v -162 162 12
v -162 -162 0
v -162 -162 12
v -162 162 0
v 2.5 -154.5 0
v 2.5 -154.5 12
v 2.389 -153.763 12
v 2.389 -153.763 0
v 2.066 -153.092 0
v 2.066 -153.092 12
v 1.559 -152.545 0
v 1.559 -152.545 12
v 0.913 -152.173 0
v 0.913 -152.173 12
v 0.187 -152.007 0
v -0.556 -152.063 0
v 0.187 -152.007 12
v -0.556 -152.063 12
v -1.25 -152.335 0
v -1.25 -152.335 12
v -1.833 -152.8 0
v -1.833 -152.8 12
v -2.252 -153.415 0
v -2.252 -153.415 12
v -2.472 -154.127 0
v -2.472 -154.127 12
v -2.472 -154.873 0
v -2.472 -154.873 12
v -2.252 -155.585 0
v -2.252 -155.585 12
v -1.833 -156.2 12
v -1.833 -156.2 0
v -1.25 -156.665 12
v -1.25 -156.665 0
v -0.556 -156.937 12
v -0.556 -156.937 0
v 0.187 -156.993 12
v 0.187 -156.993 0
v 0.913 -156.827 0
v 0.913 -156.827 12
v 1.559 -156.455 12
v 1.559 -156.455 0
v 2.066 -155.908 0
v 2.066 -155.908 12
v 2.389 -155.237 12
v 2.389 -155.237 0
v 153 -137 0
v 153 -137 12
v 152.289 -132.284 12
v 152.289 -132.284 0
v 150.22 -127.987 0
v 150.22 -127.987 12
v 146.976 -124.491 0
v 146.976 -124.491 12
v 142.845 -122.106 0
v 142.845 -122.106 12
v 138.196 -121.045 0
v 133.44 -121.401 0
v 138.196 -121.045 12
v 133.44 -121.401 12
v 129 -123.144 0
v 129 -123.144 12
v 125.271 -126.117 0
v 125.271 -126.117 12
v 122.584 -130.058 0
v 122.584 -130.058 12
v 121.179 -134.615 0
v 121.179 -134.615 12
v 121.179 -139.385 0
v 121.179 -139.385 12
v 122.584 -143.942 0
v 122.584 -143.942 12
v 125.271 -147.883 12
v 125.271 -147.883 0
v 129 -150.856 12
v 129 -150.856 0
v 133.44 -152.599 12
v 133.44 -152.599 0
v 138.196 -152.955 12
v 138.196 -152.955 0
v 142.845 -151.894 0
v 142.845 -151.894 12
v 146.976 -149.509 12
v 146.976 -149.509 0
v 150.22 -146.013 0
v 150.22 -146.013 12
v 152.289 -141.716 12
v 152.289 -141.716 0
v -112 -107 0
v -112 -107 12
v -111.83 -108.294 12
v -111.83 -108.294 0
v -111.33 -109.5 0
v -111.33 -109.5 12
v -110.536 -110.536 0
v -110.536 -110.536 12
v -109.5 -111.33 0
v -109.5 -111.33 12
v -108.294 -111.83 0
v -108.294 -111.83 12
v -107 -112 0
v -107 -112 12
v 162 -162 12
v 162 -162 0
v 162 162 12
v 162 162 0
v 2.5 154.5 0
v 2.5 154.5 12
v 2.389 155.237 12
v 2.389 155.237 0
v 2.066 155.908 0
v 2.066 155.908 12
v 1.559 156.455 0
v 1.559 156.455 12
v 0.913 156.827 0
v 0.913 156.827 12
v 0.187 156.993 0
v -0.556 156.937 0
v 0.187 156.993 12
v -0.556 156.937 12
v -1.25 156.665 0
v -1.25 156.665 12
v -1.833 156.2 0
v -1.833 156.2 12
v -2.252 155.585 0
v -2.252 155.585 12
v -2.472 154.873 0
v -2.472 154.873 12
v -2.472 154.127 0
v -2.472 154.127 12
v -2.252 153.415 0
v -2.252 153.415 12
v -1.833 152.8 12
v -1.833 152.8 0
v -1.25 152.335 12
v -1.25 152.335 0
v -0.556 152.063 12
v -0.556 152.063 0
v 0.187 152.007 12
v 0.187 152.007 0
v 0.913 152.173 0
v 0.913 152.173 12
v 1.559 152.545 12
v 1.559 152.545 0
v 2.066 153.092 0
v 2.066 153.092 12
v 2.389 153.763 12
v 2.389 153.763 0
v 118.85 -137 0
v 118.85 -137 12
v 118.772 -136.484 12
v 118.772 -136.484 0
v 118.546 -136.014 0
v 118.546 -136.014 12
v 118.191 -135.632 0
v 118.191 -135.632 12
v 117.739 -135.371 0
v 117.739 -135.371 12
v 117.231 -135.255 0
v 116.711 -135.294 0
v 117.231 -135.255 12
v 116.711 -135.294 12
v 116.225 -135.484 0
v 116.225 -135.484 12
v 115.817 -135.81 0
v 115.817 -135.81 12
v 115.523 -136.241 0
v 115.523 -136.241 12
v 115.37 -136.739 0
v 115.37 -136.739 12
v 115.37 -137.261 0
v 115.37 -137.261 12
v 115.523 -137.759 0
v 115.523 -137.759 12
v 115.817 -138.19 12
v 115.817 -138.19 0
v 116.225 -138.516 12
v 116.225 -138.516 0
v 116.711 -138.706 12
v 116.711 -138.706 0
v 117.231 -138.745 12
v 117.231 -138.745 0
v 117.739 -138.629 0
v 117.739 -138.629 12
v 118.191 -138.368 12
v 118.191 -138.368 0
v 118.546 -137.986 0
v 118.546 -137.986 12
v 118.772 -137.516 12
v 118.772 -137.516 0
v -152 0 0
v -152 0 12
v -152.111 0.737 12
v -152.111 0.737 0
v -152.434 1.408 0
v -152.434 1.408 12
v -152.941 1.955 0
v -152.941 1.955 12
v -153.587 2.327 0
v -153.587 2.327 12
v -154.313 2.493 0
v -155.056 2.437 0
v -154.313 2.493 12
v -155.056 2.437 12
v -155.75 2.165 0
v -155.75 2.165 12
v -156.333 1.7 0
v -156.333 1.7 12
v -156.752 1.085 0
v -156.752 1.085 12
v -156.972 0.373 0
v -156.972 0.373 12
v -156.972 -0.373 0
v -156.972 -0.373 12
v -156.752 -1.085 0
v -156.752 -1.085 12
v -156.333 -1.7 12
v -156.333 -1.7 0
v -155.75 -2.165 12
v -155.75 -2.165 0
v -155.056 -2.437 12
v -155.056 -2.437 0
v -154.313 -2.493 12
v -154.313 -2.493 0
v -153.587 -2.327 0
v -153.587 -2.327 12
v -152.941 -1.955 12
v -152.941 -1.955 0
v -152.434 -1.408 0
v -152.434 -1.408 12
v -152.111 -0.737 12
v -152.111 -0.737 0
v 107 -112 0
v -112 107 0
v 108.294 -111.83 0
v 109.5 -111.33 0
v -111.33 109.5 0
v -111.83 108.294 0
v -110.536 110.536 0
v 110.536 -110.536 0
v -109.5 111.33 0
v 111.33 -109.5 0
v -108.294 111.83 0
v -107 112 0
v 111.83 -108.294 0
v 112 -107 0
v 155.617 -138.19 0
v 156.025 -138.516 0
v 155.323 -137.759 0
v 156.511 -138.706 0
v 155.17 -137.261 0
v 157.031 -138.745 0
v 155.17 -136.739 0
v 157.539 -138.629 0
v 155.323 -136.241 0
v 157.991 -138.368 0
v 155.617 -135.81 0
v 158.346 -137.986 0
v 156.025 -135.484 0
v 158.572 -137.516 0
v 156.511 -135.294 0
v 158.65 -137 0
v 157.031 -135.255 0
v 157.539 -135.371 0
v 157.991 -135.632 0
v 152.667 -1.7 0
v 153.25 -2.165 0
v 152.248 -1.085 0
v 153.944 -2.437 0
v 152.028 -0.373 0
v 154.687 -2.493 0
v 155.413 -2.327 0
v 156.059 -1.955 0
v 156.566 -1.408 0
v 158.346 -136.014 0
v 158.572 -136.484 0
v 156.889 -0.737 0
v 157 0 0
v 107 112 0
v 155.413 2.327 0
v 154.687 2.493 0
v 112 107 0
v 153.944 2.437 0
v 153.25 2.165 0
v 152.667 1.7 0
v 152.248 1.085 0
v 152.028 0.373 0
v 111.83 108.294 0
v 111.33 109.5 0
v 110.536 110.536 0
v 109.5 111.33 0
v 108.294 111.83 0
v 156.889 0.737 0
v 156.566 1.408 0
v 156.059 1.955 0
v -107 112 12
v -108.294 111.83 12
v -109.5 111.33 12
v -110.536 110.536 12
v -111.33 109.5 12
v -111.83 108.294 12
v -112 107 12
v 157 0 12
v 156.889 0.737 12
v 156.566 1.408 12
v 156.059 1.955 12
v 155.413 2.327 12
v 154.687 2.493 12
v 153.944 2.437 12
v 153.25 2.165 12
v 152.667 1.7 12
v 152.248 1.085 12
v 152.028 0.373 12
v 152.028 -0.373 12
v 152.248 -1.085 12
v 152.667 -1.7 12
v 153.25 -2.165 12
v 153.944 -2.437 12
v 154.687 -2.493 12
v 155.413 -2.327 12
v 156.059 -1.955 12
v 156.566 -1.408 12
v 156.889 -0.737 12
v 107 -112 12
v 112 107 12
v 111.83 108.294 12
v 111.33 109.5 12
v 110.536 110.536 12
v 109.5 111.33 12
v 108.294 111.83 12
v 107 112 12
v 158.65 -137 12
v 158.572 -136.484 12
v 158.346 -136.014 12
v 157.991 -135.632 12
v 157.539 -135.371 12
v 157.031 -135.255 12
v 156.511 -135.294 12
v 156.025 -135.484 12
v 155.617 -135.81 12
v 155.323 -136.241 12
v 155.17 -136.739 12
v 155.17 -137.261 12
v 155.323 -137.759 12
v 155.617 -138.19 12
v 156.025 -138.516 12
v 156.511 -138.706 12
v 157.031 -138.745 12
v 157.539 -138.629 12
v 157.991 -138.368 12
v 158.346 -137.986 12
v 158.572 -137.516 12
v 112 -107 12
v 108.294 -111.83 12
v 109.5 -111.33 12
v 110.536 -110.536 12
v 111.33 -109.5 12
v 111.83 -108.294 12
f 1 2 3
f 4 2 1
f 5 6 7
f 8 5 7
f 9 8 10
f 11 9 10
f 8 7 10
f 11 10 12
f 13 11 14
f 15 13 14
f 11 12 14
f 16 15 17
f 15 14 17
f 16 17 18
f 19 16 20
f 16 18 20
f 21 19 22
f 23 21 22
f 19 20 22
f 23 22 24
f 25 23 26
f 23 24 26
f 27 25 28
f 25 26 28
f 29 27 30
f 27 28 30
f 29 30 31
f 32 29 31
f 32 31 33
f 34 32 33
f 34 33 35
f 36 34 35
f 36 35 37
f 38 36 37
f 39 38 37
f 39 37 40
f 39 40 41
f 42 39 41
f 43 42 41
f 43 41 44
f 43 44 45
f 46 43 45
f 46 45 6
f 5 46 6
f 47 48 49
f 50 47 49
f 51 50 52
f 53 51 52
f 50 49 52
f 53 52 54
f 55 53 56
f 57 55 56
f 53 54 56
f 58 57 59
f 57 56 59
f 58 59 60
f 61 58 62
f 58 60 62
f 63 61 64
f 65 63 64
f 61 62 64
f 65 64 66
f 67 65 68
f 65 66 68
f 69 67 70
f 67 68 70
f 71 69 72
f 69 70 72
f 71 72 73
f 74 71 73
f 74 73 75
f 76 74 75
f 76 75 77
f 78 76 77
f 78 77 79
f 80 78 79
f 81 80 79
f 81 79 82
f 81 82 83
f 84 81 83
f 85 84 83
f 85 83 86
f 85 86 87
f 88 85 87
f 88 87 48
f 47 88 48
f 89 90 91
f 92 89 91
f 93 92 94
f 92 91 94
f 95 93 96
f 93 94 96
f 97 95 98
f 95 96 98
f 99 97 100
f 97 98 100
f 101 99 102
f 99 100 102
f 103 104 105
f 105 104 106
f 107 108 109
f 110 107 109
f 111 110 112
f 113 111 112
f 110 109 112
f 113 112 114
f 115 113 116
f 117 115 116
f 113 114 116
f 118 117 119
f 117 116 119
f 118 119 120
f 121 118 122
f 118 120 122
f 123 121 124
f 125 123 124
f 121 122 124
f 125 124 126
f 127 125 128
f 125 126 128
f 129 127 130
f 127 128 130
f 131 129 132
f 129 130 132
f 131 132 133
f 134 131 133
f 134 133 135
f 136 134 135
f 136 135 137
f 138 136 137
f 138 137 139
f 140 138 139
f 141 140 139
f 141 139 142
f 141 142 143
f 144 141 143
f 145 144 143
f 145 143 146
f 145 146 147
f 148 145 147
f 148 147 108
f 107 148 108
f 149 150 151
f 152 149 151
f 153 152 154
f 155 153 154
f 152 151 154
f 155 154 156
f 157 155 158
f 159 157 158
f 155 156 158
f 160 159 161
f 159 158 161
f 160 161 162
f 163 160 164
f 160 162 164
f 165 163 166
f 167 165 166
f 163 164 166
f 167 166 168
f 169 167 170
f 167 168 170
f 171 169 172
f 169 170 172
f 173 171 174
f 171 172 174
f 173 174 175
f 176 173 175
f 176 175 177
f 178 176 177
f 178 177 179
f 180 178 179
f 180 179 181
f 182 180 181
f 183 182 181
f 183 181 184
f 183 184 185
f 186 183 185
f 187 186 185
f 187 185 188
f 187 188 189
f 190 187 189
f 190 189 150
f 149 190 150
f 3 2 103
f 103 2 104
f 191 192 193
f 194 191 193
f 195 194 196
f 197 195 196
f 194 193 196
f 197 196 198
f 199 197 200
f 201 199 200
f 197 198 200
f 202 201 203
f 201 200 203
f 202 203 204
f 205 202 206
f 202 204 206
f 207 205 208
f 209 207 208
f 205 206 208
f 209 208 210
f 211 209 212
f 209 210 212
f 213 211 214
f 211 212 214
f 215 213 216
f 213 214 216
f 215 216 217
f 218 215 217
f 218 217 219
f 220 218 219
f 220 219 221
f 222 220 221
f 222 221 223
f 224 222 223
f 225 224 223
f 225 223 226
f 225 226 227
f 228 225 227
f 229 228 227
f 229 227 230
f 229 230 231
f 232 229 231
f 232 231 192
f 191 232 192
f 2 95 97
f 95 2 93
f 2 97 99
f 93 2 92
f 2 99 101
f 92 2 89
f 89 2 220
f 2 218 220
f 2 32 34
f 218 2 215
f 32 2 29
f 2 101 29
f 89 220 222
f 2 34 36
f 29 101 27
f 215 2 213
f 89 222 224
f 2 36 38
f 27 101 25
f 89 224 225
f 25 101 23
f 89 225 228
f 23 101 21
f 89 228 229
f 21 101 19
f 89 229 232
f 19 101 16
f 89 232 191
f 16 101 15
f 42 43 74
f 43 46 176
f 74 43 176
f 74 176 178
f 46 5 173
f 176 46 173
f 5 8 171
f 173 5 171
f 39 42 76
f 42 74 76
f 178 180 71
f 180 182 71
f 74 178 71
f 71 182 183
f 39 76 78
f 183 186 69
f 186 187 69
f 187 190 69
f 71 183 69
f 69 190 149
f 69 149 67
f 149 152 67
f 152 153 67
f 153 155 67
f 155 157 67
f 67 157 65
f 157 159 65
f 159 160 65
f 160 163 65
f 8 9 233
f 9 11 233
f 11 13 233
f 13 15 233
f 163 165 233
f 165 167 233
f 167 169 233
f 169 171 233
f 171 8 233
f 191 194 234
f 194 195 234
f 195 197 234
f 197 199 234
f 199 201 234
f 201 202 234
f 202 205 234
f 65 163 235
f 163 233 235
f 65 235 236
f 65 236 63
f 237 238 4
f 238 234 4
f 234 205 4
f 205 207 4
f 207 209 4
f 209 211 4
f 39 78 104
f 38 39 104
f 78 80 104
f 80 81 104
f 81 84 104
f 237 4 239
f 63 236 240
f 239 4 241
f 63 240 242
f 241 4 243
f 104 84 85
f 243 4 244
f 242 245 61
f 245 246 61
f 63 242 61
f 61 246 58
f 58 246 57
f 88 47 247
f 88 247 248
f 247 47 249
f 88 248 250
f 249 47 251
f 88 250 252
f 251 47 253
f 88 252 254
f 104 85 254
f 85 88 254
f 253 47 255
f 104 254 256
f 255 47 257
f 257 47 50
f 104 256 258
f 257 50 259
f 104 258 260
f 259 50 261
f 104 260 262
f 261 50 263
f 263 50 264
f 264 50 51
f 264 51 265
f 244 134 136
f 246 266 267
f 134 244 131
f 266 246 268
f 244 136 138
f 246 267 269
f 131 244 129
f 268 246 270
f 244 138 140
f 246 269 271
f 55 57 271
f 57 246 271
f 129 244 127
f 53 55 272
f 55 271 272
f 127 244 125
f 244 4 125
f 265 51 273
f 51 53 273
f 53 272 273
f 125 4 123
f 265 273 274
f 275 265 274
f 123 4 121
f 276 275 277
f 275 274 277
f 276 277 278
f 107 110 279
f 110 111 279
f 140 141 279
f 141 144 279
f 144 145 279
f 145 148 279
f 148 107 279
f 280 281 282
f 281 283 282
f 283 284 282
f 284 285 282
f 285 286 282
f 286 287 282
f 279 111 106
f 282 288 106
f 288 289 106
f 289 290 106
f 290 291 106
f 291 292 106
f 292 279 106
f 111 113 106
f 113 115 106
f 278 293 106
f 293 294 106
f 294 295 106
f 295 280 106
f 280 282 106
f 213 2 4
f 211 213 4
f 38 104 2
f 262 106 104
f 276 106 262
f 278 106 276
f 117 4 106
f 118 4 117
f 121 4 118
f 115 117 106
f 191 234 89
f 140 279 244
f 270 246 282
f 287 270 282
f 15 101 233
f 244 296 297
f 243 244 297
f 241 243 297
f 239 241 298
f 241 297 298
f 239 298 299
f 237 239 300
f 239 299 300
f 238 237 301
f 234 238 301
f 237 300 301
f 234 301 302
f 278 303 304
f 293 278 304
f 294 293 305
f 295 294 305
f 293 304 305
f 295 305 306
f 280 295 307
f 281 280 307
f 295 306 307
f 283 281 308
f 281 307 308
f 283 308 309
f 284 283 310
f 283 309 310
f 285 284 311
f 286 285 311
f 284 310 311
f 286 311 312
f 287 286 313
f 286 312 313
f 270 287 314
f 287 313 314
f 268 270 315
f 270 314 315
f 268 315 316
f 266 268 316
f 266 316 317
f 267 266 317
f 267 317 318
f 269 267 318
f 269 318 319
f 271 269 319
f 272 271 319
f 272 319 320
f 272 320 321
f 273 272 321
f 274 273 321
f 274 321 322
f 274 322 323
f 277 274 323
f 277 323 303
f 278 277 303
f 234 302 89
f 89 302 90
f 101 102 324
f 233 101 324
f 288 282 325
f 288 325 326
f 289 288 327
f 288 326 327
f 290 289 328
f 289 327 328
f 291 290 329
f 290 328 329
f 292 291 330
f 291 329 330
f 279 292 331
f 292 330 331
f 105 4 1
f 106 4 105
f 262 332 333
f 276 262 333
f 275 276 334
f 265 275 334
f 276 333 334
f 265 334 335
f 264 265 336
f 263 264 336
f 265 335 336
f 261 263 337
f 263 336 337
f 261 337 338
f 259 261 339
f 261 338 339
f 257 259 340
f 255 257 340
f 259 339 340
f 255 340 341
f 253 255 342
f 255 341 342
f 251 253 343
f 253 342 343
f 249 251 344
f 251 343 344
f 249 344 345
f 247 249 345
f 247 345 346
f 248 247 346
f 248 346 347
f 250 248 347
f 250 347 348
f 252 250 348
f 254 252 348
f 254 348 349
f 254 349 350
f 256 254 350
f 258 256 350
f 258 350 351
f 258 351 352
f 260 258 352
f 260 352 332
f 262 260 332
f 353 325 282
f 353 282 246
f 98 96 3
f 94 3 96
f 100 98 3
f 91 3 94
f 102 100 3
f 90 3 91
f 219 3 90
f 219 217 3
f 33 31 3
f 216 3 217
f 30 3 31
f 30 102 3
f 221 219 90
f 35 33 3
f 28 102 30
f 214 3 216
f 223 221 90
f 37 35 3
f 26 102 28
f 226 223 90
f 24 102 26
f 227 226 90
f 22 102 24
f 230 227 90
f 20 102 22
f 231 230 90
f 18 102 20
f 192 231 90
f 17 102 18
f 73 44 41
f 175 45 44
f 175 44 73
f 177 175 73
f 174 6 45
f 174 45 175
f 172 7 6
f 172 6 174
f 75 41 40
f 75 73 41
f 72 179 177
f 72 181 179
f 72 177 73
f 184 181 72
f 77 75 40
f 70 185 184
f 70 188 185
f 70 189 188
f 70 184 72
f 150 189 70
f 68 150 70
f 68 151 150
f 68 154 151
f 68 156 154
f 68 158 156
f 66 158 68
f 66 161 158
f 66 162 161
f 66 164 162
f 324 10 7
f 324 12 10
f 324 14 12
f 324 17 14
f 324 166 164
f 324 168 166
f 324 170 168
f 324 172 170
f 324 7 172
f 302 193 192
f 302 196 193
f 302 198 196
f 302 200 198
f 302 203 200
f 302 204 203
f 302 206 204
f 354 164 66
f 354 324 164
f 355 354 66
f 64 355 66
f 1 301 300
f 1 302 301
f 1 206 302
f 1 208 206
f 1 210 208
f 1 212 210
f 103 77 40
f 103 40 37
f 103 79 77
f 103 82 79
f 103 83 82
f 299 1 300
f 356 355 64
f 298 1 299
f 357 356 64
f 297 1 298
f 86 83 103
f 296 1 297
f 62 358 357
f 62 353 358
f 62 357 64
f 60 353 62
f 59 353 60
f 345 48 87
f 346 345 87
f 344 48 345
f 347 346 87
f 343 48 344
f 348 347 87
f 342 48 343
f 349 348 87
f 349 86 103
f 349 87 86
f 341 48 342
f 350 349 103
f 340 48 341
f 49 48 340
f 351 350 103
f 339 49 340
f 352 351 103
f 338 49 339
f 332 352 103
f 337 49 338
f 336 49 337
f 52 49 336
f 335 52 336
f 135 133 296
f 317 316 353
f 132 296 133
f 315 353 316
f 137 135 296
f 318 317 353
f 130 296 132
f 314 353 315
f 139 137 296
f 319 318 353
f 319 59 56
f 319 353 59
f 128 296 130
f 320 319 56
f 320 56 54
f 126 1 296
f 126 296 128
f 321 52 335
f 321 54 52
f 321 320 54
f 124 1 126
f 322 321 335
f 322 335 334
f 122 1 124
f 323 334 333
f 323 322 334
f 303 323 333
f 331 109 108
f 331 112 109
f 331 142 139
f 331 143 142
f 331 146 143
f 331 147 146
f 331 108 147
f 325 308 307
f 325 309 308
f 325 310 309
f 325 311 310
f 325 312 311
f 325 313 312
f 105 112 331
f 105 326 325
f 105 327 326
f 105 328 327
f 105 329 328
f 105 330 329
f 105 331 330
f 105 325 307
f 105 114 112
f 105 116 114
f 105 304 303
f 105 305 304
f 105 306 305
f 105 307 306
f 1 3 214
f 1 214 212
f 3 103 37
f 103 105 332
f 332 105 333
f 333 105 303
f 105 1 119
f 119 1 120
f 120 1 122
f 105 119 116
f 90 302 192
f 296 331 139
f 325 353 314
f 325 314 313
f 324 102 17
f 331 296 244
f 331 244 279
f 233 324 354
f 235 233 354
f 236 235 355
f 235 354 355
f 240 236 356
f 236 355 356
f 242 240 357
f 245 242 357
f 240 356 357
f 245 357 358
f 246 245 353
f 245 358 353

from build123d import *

# Parameters (mm, degrees)
SKETCH_W        = 324
SKETCH_H        = 324
PAD_DEPTH       = 12
POCKET_DEPTH    = 12.001
SKETCH002_R     = 2.5
POCKET001_DEPTH = 12.001
SKETCH003_R     = 16
SKETCH003_R_2   = 1.75
POCKET002_DEPTH = 12.001


with BuildPart() as part:
    # Sketch → Pad (new body)
    with BuildSketch(Plane.XY):
        Rectangle(SKETCH_W, SKETCH_H)
    extrude(amount=PAD_DEPTH)

    # Sketch001 (on Face6 of Pad) → Pocket (cut, through all)
    with BuildSketch(Plane.XY.offset(12)):
        with BuildLine():
            Line((-112, 107.000007), (-112, -106.999984))
            ThreePointArc((-112, -106.999984), (-110.535541, -110.535527), (-107.000004, -112))
            Line((-107.000004, -112), (107.000004, -112))
            ThreePointArc((107.000004, -112), (110.535542, -110.535526), (112, -106.999982))
            Line((112, 107.000009), (112, -106.999982))
            ThreePointArc((112, 107.000009), (110.535532, 110.535536), (107.000003, 112))
            Line((-107.000005, 112), (107.000003, 112))
            ThreePointArc((-107.000005, 112), (-110.535533, 110.535535), (-112, 107.000007))
        make_face()
    extrude(amount=-POCKET_DEPTH, mode=Mode.SUBTRACT)

    # Sketch002 (on Face5 of Pocket) → Pocket001 (cut, through all)
    with BuildSketch(Plane.XY.offset(12)):
        with Locations((0, 154.5)):
            Circle(SKETCH002_R)
        with Locations((-154.5, 0)):
            Circle(SKETCH002_R)
        with Locations((154.5, 0)):
            Circle(SKETCH002_R)
        with Locations((0, -154.5)):
            Circle(SKETCH002_R)
    extrude(amount=-POCKET001_DEPTH, mode=Mode.SUBTRACT)

    # Sketch003 (on Face5 of Pocket001) → Pocket002 (cut, through all)
    with BuildSketch(Plane.XY.offset(12)):
        with Locations((137, -137)):
            Circle(SKETCH003_R)
        with Locations((117.1, -137)):
            Circle(SKETCH003_R_2)
        with Locations((156.9, -137)):
            Circle(SKETCH003_R_2)
    extrude(amount=-POCKET002_DEPTH, mode=Mode.SUBTRACT)


solid = part.part
